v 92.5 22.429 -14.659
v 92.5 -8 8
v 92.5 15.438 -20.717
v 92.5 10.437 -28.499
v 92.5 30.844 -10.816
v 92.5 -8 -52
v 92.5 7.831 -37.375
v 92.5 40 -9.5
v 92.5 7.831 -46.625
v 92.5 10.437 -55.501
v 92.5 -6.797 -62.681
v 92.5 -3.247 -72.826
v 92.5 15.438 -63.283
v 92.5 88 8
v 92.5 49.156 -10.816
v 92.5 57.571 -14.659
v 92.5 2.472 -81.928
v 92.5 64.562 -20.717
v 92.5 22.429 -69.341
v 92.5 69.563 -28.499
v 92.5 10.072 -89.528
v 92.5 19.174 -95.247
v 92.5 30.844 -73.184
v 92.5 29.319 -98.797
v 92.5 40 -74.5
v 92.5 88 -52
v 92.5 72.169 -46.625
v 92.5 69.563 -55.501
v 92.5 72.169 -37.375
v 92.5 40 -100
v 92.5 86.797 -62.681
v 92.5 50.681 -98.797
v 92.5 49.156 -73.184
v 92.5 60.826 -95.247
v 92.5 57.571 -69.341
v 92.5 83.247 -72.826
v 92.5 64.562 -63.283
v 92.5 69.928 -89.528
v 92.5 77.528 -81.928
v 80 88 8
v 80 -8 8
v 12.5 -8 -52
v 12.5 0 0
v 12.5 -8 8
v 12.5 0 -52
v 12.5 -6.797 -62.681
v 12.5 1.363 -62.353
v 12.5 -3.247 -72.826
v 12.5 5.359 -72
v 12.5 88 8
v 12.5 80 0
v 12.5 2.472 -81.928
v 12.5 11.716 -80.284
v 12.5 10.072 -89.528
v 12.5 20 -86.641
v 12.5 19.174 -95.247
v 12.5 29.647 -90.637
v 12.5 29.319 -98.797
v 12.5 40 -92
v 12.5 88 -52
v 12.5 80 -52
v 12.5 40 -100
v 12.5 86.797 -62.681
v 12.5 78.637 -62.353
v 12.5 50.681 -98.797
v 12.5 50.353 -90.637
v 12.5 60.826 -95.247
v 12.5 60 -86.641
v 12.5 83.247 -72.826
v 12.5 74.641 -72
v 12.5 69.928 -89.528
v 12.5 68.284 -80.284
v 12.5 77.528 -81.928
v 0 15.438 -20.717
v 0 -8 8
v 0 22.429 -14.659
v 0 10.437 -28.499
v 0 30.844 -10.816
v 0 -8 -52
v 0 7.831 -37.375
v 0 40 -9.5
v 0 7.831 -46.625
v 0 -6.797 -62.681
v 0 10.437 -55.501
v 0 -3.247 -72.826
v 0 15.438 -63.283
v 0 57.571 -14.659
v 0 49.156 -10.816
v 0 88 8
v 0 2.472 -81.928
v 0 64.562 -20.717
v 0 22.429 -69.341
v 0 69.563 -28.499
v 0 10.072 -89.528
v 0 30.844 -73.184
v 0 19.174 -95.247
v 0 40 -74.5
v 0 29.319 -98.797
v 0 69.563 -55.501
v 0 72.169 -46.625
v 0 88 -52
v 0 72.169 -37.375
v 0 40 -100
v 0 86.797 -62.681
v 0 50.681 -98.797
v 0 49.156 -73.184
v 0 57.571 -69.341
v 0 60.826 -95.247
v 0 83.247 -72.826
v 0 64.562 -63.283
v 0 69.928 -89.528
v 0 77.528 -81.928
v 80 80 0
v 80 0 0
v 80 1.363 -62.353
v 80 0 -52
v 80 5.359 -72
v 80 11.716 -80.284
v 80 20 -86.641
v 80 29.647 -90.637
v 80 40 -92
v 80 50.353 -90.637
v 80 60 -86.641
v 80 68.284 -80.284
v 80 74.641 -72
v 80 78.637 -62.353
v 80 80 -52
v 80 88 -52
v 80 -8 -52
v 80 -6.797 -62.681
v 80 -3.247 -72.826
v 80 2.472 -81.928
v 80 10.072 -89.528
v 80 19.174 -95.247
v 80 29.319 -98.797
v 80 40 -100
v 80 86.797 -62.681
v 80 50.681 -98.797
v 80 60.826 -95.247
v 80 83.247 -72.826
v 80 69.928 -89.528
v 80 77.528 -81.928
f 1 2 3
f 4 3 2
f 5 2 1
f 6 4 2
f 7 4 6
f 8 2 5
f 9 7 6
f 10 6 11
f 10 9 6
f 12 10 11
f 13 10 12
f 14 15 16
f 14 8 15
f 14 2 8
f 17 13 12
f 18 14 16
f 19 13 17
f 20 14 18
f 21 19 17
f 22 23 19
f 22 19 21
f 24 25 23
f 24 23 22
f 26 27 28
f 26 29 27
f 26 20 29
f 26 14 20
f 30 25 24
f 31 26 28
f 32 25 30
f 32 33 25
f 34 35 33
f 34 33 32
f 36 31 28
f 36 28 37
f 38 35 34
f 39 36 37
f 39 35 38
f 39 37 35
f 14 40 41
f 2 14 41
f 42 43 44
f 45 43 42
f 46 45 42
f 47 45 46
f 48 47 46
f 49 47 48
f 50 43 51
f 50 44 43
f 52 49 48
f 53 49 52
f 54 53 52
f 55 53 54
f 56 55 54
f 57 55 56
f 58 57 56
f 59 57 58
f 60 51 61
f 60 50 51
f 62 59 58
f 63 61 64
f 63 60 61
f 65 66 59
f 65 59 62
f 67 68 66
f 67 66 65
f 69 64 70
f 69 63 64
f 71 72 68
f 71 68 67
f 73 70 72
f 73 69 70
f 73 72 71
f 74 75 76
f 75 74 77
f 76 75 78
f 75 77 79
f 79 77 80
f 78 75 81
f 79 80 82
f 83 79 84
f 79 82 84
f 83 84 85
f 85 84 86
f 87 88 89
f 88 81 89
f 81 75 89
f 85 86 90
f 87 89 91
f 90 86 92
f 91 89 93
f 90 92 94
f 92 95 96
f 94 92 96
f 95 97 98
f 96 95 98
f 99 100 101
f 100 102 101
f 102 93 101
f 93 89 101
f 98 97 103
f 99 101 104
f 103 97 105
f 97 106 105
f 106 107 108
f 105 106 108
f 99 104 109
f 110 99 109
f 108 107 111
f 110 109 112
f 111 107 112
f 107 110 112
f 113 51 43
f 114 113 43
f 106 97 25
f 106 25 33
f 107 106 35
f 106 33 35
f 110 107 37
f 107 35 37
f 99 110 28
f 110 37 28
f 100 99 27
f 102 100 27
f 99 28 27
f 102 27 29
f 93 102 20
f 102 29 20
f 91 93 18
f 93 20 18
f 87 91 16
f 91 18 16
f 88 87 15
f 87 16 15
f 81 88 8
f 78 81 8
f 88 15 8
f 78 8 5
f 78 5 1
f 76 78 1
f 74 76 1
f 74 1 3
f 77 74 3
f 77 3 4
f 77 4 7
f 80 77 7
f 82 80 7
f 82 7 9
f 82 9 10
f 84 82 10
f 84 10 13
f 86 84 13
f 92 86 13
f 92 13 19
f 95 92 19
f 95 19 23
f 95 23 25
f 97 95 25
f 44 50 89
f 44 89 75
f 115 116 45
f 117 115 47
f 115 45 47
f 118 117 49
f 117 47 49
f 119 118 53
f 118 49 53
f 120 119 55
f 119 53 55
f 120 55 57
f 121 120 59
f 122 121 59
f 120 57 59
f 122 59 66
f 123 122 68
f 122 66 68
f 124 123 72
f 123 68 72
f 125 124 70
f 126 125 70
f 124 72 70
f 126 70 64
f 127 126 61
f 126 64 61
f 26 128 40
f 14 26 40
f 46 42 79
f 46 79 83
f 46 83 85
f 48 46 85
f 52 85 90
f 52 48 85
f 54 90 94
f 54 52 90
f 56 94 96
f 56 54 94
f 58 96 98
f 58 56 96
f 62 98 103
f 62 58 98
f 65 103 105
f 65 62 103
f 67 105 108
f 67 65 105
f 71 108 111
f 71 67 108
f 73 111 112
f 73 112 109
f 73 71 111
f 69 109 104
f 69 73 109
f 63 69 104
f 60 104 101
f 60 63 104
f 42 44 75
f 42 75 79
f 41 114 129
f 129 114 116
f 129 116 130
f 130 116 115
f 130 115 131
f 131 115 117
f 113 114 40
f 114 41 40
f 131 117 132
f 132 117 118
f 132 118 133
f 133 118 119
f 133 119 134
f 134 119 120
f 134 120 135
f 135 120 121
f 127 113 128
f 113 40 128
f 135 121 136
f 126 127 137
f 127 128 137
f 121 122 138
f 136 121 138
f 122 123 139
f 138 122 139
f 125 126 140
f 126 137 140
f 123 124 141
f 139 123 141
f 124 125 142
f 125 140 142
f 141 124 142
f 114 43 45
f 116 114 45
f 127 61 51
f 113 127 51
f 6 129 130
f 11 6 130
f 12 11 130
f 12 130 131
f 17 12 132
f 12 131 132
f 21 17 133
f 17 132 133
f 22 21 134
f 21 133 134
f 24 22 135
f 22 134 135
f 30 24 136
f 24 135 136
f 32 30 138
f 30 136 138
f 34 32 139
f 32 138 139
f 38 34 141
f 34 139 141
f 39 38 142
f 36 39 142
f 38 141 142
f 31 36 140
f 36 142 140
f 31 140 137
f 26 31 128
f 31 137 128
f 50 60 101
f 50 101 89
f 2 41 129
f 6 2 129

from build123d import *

# Parameters (mm, degrees)
BOSS_EXTRUDE1_DEPTH = 80
BOSS_EXTRUDE2_DEPTH = 12.5
CUT_EXTRUDE1_REACH  = 94.5
SKETCH3_R           = 32.5


with BuildPart() as part:
    # Sketch1 → Boss-Extrude1 (new body)
    with BuildSketch(Plane(origin=(0, 0, 0), x_dir=(0, 0, -1), z_dir=(1, 0, 0))):
        with BuildLine():
            Line((0, 0), (52, 0))
            ThreePointArc((52, 0), (92, 40), (52, 80))
            Line((52, 80), (0, 80))
            Line((0, 80), (0, 0))
        make_face()
    extrude(amount=BOSS_EXTRUDE1_DEPTH)

    # Sketch2 → Boss-Extrude2 (add)
    with BuildSketch(Plane(origin=(80, 0, 0), x_dir=(0, 0, -1), z_dir=(1, 0, 0))):
        with BuildLine():
            Line((-8, 88), (-8, -8))
            Line((-8, -8), (52, -8))
            ThreePointArc((52, -8), (100, 40), (52, 88))
            Line((52, 88), (-8, 88))
        make_face()
    boss_extrude2 = extrude(amount=BOSS_EXTRUDE2_DEPTH)

    # Mirror1: Boss-Extrude2 across plane
    add(boss_extrude2.mirror(Plane(origin=(46.25, 0, 0), x_dir=(0, 0, 1), z_dir=(1, 0, 0))))

    # Sketch3 → Cut-Extrude1 (cut, up to next)
    with BuildSketch(Plane(origin=(92.5, 0, 0), x_dir=(0, 0, -1), z_dir=(1, 0, 0)), mode=Mode.PRIVATE) as cut_extrude1_sk1:
        with Locations((42, 40)):
            Circle(SKETCH3_R)
    cut_extrude1_tool1 = extrude(cut_extrude1_sk1.sketch, amount=-CUT_EXTRUDE1_REACH, mode=Mode.PRIVATE) & part.part
    add(cut_extrude1_tool1.solids().sort_by_distance((92.5, 40, -42))[0], mode=Mode.SUBTRACT)


solid = part.part
